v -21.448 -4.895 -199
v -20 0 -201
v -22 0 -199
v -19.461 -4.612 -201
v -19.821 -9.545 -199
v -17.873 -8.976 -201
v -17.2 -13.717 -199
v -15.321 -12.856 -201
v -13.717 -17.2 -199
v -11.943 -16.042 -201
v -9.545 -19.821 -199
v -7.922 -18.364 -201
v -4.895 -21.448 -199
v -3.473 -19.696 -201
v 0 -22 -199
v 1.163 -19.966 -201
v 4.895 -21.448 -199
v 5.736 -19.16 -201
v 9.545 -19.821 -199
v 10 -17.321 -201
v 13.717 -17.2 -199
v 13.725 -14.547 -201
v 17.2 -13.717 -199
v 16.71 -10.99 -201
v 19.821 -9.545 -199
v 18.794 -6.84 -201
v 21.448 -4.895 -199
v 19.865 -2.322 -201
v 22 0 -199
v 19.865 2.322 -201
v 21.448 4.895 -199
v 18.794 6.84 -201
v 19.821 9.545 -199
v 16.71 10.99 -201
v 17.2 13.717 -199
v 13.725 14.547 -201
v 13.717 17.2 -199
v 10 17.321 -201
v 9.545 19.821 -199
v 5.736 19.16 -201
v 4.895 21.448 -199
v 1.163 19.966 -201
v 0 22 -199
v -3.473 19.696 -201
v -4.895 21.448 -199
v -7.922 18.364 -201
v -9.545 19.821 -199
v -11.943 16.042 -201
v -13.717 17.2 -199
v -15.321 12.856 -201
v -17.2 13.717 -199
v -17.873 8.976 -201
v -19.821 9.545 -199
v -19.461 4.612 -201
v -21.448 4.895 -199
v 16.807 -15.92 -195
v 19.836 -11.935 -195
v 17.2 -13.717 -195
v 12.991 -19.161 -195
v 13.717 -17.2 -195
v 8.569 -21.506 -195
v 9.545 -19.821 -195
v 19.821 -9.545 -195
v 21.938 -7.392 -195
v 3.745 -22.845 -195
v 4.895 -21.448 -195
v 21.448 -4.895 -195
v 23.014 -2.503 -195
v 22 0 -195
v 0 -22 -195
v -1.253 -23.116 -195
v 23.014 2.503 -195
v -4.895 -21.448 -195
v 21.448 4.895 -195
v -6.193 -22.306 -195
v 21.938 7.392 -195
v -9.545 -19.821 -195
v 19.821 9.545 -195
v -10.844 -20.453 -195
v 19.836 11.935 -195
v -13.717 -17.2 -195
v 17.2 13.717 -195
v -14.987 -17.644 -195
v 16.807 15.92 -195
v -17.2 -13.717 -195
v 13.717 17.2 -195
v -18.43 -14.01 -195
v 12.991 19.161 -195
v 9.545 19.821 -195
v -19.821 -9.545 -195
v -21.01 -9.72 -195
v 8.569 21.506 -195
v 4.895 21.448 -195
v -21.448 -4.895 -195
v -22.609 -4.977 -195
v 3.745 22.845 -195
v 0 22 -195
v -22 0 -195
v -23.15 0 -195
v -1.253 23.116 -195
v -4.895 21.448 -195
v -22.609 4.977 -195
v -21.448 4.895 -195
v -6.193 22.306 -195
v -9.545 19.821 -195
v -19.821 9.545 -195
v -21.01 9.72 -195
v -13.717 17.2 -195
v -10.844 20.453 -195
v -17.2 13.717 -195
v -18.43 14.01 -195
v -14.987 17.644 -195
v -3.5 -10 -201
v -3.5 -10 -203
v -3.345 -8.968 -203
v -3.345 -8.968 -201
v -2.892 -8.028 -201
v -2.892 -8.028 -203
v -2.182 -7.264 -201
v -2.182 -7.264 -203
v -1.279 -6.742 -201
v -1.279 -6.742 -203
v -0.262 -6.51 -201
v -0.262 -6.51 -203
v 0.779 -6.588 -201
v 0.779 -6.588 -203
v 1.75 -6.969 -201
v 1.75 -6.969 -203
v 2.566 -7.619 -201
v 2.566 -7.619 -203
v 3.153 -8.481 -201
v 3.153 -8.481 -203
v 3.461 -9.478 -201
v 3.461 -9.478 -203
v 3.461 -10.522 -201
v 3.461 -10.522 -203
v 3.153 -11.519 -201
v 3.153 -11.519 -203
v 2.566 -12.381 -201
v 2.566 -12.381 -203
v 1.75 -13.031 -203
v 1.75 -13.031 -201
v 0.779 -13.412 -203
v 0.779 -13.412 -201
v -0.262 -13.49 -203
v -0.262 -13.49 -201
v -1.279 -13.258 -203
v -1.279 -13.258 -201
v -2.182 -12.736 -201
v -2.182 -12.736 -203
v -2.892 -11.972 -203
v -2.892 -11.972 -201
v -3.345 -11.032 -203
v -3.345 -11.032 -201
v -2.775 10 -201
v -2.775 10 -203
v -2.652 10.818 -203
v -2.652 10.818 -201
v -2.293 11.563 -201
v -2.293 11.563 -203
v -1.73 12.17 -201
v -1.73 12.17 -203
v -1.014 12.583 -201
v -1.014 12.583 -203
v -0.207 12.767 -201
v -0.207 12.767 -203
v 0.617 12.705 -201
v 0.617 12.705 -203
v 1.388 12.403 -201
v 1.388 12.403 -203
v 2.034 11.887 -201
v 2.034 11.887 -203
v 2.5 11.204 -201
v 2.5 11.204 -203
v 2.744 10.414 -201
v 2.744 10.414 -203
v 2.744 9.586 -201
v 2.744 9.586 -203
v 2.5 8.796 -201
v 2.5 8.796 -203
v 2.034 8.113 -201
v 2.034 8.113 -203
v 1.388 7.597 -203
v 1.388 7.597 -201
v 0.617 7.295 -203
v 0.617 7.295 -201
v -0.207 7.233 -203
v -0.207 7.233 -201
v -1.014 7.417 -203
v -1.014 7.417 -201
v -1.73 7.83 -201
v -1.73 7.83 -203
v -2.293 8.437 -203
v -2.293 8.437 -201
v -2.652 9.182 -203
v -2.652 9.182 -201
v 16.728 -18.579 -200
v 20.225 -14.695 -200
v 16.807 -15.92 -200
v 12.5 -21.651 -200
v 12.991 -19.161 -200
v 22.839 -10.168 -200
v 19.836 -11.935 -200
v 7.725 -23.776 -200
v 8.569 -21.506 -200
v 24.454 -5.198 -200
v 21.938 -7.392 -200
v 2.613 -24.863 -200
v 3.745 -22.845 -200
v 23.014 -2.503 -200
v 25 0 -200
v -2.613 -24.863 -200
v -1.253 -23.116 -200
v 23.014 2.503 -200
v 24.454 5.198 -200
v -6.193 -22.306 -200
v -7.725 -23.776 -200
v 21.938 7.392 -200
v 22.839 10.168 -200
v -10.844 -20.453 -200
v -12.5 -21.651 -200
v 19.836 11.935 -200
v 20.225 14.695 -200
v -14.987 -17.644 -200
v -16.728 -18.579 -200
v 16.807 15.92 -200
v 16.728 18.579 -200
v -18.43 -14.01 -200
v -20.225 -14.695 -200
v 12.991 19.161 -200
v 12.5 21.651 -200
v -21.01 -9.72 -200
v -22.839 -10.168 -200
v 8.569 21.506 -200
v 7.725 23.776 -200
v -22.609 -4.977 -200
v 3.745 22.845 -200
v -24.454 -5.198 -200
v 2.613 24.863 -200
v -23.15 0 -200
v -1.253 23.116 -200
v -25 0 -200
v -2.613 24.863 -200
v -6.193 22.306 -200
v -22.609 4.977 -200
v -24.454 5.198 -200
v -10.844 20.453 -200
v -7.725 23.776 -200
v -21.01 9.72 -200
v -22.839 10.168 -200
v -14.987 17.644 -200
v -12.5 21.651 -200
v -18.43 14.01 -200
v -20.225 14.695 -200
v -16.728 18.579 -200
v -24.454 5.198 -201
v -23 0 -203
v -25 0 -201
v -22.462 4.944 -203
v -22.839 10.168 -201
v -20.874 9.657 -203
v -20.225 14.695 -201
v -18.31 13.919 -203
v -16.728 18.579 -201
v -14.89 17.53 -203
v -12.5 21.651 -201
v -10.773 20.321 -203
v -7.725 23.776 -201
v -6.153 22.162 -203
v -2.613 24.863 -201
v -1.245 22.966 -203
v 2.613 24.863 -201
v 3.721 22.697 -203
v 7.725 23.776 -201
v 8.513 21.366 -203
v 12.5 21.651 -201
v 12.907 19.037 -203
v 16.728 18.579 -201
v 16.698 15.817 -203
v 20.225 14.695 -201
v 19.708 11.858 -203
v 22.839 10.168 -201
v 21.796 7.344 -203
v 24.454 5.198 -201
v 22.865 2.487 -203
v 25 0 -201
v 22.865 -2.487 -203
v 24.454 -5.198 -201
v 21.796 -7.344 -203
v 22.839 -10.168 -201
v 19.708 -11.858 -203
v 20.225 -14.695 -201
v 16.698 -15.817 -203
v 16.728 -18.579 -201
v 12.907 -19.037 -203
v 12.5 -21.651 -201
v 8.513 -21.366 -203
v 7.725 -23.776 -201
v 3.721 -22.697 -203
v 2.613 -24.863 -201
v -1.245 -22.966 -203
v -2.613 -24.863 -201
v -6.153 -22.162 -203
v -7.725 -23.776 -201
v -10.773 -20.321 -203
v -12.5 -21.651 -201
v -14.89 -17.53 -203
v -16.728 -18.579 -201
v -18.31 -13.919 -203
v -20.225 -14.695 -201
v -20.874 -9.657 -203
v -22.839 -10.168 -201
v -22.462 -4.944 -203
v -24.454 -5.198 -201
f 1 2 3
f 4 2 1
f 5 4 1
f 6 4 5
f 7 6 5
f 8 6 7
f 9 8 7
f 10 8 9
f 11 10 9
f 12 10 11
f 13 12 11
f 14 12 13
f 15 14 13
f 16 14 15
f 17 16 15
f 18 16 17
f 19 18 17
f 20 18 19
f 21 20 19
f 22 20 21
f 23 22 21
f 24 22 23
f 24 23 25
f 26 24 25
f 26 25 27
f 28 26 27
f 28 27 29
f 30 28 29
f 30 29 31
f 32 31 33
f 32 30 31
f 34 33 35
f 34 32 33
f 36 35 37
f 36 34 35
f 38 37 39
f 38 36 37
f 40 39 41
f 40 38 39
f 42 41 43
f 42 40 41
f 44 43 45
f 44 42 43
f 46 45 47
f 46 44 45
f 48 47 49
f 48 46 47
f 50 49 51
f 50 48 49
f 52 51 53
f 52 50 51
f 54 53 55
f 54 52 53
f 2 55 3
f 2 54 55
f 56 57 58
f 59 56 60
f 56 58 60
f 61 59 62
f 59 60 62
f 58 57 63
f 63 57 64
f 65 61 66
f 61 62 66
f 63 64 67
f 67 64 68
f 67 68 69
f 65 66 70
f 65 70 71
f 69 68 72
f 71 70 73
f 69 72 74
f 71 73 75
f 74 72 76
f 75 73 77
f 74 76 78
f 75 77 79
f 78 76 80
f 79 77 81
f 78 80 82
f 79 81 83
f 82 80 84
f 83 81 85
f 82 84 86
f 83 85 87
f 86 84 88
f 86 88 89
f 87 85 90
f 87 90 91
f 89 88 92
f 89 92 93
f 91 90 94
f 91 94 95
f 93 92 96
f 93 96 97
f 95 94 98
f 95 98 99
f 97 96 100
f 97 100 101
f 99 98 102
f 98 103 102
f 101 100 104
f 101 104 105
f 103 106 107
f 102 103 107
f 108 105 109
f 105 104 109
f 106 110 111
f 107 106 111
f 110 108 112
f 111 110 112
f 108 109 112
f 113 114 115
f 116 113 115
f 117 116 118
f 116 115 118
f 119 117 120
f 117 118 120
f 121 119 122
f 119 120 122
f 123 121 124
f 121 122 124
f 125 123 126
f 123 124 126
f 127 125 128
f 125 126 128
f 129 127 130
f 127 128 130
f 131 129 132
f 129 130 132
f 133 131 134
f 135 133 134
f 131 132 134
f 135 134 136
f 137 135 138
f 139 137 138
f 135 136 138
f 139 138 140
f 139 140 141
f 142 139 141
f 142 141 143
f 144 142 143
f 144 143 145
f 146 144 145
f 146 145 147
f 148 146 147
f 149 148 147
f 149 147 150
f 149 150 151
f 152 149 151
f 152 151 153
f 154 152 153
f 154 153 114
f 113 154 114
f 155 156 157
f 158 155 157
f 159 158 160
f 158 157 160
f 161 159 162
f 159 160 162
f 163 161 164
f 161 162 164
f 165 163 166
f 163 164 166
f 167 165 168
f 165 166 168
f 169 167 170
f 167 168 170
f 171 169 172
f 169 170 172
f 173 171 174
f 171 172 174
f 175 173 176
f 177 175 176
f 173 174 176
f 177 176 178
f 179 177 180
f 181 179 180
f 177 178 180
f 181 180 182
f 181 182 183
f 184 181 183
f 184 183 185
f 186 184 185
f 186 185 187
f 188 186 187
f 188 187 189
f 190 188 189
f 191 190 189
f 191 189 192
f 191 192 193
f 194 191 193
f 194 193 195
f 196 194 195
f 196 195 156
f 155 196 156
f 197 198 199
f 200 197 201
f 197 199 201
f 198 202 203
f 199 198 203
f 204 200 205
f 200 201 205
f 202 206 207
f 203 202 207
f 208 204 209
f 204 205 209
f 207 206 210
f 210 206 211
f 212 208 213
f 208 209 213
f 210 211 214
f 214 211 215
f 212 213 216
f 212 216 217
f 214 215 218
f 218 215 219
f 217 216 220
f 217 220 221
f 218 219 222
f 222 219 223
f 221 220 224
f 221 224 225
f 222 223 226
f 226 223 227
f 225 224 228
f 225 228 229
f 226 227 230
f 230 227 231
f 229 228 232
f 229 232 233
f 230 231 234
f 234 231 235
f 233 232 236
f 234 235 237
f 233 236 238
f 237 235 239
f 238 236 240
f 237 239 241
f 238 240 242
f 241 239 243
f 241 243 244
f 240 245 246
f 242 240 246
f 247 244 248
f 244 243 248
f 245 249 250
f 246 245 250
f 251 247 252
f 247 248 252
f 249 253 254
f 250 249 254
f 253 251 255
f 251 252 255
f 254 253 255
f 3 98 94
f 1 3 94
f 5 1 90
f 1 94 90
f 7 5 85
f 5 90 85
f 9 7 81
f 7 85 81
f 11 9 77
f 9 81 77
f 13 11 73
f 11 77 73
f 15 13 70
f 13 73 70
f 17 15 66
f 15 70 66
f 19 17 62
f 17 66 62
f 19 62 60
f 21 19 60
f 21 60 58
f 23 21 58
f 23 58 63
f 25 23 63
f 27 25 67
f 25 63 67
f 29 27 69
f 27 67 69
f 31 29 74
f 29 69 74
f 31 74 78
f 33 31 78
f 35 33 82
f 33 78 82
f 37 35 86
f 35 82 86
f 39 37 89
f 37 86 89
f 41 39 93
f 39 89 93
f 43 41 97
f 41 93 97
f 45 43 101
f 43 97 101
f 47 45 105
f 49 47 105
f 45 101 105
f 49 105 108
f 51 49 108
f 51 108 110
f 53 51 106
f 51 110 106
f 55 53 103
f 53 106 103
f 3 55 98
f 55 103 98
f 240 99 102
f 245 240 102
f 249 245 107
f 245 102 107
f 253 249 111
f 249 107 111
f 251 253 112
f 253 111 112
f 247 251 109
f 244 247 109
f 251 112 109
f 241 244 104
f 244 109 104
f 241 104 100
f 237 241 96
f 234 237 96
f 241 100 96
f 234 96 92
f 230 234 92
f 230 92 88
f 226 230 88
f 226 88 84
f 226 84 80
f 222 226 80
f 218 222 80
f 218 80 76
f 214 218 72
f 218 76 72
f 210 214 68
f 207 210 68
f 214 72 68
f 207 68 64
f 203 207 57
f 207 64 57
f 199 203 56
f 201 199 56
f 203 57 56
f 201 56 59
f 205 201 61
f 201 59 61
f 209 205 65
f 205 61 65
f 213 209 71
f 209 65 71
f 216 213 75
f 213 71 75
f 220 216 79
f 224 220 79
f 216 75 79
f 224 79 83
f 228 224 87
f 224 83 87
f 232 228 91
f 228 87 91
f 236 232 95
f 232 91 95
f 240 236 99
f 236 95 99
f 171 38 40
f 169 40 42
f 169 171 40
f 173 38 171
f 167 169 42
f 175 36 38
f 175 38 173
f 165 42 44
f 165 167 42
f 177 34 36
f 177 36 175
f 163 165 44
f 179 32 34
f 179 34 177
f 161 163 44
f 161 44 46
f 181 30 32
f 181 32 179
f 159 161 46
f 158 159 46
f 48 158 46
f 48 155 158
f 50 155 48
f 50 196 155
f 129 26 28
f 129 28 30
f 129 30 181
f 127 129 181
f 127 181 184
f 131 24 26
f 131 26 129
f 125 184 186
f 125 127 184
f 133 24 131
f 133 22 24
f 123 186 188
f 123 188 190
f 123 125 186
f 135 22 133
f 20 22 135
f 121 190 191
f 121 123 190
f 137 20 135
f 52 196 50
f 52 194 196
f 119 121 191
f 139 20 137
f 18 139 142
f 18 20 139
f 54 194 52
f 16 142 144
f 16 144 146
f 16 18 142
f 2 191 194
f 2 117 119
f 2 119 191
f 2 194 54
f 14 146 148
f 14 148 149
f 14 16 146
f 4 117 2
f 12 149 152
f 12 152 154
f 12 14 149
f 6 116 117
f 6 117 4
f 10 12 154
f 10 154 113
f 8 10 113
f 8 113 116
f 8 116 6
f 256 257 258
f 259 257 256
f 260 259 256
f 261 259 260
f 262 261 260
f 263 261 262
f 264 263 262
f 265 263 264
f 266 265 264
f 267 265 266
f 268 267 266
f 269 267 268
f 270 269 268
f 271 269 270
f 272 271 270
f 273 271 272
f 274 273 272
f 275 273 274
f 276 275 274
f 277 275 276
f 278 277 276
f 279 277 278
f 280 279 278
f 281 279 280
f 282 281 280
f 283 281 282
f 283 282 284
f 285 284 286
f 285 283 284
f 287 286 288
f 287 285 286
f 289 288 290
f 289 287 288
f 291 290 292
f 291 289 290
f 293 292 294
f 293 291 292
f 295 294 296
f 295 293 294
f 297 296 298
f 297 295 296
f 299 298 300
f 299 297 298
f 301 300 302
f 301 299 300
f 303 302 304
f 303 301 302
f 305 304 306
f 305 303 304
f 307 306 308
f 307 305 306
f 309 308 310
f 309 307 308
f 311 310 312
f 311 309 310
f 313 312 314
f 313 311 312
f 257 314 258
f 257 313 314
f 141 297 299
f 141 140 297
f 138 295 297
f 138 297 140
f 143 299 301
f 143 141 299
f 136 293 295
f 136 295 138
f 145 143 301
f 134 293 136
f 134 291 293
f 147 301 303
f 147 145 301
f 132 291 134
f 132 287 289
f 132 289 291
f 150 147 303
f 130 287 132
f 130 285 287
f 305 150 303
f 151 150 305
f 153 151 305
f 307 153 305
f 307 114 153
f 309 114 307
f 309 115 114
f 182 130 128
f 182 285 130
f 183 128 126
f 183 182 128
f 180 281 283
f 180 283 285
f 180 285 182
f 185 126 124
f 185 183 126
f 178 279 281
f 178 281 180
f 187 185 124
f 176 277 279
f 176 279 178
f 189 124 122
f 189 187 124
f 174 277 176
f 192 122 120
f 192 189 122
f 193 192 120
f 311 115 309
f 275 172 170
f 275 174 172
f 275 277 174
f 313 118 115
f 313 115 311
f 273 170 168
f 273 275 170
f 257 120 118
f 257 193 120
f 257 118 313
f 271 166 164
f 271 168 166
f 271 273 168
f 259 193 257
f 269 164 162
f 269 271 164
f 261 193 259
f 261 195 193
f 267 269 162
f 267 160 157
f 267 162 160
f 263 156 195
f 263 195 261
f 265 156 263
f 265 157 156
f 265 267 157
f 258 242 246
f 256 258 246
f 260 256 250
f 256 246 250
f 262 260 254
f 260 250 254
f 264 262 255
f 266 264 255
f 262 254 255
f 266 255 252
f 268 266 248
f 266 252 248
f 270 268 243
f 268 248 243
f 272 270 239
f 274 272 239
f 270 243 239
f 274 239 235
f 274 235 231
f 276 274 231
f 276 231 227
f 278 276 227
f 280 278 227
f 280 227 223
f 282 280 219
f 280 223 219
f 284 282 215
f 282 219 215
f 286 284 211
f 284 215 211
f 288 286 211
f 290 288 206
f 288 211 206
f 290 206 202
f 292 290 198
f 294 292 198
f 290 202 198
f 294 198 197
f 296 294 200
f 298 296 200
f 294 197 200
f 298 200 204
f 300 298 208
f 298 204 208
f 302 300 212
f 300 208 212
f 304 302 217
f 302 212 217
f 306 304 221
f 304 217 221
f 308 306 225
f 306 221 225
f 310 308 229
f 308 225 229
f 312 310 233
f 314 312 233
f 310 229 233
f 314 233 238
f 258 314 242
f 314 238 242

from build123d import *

# Parameters (mm, degrees)
SKETCH003_R             = 23.15
PAD002_DEPTH            = 5
SKETCH004_R             = 25
PAD003_DEPTH            = 3
CHAMFER002_SIZE         = 2
SKETCH005_R             = 22
POCKET001_DEPTH         = 6
CHAMFER003_SIZE         = 2
SKETCH006_R             = 2.775
SKETCH006_R_2           = 3.5
POCKET002_DEPTH         = 5
BODY001_PLACEMENT_ANGLE = 180


with BuildPart() as part:
    # Sketch003 → Pad002 (new body)
    with BuildSketch(Plane.XY):
        Circle(SKETCH003_R)
    extrude(amount=PAD002_DEPTH)

    # Sketch004 (on Face3 of Pad002) → Pad003 (join)
    with BuildSketch(Plane.XY.offset(5)):
        Circle(SKETCH004_R)
    extrude(amount=PAD003_DEPTH)

    # Chamfer002
    chamfer002_edges = [part.edges().sort_by_distance(p)[0] for p in [
        (-25, 0, 8),
    ]]
    chamfer(chamfer002_edges, length=CHAMFER002_SIZE)

    # Sketch005 (on Face6 of Chamfer002) → Pocket001 (cut)
    with BuildSketch(Plane(origin=(0, 0, 0), x_dir=(1, 0, 0), z_dir=(0, 0, -1))):
        Circle(SKETCH005_R)
    extrude(amount=-POCKET001_DEPTH, mode=Mode.SUBTRACT)

    # Chamfer003
    chamfer003_edges = [part.edges().sort_by_distance(p)[0] for p in [
        (-22, 0, 6),
    ]]
    chamfer(chamfer003_edges, length=CHAMFER003_SIZE)

    # Sketch006 (on Face9 of Chamfer003) → Pocket002 (cut)
    with BuildSketch(Plane.XY.offset(8)):
        with Locations((0, 10)):
            Circle(SKETCH006_R)
        with Locations((0, -10)):
            Circle(SKETCH006_R_2)
    extrude(amount=-POCKET002_DEPTH, mode=Mode.SUBTRACT)


with BuildPart() as part_1:
    # Body001 placement: moved
    add(part.part.moved(Location((0, 0, -195))).rotate(Axis((0, 0, -195), (0, 1, 0)), BODY001_PLACEMENT_ANGLE))


solid = part_1.part
